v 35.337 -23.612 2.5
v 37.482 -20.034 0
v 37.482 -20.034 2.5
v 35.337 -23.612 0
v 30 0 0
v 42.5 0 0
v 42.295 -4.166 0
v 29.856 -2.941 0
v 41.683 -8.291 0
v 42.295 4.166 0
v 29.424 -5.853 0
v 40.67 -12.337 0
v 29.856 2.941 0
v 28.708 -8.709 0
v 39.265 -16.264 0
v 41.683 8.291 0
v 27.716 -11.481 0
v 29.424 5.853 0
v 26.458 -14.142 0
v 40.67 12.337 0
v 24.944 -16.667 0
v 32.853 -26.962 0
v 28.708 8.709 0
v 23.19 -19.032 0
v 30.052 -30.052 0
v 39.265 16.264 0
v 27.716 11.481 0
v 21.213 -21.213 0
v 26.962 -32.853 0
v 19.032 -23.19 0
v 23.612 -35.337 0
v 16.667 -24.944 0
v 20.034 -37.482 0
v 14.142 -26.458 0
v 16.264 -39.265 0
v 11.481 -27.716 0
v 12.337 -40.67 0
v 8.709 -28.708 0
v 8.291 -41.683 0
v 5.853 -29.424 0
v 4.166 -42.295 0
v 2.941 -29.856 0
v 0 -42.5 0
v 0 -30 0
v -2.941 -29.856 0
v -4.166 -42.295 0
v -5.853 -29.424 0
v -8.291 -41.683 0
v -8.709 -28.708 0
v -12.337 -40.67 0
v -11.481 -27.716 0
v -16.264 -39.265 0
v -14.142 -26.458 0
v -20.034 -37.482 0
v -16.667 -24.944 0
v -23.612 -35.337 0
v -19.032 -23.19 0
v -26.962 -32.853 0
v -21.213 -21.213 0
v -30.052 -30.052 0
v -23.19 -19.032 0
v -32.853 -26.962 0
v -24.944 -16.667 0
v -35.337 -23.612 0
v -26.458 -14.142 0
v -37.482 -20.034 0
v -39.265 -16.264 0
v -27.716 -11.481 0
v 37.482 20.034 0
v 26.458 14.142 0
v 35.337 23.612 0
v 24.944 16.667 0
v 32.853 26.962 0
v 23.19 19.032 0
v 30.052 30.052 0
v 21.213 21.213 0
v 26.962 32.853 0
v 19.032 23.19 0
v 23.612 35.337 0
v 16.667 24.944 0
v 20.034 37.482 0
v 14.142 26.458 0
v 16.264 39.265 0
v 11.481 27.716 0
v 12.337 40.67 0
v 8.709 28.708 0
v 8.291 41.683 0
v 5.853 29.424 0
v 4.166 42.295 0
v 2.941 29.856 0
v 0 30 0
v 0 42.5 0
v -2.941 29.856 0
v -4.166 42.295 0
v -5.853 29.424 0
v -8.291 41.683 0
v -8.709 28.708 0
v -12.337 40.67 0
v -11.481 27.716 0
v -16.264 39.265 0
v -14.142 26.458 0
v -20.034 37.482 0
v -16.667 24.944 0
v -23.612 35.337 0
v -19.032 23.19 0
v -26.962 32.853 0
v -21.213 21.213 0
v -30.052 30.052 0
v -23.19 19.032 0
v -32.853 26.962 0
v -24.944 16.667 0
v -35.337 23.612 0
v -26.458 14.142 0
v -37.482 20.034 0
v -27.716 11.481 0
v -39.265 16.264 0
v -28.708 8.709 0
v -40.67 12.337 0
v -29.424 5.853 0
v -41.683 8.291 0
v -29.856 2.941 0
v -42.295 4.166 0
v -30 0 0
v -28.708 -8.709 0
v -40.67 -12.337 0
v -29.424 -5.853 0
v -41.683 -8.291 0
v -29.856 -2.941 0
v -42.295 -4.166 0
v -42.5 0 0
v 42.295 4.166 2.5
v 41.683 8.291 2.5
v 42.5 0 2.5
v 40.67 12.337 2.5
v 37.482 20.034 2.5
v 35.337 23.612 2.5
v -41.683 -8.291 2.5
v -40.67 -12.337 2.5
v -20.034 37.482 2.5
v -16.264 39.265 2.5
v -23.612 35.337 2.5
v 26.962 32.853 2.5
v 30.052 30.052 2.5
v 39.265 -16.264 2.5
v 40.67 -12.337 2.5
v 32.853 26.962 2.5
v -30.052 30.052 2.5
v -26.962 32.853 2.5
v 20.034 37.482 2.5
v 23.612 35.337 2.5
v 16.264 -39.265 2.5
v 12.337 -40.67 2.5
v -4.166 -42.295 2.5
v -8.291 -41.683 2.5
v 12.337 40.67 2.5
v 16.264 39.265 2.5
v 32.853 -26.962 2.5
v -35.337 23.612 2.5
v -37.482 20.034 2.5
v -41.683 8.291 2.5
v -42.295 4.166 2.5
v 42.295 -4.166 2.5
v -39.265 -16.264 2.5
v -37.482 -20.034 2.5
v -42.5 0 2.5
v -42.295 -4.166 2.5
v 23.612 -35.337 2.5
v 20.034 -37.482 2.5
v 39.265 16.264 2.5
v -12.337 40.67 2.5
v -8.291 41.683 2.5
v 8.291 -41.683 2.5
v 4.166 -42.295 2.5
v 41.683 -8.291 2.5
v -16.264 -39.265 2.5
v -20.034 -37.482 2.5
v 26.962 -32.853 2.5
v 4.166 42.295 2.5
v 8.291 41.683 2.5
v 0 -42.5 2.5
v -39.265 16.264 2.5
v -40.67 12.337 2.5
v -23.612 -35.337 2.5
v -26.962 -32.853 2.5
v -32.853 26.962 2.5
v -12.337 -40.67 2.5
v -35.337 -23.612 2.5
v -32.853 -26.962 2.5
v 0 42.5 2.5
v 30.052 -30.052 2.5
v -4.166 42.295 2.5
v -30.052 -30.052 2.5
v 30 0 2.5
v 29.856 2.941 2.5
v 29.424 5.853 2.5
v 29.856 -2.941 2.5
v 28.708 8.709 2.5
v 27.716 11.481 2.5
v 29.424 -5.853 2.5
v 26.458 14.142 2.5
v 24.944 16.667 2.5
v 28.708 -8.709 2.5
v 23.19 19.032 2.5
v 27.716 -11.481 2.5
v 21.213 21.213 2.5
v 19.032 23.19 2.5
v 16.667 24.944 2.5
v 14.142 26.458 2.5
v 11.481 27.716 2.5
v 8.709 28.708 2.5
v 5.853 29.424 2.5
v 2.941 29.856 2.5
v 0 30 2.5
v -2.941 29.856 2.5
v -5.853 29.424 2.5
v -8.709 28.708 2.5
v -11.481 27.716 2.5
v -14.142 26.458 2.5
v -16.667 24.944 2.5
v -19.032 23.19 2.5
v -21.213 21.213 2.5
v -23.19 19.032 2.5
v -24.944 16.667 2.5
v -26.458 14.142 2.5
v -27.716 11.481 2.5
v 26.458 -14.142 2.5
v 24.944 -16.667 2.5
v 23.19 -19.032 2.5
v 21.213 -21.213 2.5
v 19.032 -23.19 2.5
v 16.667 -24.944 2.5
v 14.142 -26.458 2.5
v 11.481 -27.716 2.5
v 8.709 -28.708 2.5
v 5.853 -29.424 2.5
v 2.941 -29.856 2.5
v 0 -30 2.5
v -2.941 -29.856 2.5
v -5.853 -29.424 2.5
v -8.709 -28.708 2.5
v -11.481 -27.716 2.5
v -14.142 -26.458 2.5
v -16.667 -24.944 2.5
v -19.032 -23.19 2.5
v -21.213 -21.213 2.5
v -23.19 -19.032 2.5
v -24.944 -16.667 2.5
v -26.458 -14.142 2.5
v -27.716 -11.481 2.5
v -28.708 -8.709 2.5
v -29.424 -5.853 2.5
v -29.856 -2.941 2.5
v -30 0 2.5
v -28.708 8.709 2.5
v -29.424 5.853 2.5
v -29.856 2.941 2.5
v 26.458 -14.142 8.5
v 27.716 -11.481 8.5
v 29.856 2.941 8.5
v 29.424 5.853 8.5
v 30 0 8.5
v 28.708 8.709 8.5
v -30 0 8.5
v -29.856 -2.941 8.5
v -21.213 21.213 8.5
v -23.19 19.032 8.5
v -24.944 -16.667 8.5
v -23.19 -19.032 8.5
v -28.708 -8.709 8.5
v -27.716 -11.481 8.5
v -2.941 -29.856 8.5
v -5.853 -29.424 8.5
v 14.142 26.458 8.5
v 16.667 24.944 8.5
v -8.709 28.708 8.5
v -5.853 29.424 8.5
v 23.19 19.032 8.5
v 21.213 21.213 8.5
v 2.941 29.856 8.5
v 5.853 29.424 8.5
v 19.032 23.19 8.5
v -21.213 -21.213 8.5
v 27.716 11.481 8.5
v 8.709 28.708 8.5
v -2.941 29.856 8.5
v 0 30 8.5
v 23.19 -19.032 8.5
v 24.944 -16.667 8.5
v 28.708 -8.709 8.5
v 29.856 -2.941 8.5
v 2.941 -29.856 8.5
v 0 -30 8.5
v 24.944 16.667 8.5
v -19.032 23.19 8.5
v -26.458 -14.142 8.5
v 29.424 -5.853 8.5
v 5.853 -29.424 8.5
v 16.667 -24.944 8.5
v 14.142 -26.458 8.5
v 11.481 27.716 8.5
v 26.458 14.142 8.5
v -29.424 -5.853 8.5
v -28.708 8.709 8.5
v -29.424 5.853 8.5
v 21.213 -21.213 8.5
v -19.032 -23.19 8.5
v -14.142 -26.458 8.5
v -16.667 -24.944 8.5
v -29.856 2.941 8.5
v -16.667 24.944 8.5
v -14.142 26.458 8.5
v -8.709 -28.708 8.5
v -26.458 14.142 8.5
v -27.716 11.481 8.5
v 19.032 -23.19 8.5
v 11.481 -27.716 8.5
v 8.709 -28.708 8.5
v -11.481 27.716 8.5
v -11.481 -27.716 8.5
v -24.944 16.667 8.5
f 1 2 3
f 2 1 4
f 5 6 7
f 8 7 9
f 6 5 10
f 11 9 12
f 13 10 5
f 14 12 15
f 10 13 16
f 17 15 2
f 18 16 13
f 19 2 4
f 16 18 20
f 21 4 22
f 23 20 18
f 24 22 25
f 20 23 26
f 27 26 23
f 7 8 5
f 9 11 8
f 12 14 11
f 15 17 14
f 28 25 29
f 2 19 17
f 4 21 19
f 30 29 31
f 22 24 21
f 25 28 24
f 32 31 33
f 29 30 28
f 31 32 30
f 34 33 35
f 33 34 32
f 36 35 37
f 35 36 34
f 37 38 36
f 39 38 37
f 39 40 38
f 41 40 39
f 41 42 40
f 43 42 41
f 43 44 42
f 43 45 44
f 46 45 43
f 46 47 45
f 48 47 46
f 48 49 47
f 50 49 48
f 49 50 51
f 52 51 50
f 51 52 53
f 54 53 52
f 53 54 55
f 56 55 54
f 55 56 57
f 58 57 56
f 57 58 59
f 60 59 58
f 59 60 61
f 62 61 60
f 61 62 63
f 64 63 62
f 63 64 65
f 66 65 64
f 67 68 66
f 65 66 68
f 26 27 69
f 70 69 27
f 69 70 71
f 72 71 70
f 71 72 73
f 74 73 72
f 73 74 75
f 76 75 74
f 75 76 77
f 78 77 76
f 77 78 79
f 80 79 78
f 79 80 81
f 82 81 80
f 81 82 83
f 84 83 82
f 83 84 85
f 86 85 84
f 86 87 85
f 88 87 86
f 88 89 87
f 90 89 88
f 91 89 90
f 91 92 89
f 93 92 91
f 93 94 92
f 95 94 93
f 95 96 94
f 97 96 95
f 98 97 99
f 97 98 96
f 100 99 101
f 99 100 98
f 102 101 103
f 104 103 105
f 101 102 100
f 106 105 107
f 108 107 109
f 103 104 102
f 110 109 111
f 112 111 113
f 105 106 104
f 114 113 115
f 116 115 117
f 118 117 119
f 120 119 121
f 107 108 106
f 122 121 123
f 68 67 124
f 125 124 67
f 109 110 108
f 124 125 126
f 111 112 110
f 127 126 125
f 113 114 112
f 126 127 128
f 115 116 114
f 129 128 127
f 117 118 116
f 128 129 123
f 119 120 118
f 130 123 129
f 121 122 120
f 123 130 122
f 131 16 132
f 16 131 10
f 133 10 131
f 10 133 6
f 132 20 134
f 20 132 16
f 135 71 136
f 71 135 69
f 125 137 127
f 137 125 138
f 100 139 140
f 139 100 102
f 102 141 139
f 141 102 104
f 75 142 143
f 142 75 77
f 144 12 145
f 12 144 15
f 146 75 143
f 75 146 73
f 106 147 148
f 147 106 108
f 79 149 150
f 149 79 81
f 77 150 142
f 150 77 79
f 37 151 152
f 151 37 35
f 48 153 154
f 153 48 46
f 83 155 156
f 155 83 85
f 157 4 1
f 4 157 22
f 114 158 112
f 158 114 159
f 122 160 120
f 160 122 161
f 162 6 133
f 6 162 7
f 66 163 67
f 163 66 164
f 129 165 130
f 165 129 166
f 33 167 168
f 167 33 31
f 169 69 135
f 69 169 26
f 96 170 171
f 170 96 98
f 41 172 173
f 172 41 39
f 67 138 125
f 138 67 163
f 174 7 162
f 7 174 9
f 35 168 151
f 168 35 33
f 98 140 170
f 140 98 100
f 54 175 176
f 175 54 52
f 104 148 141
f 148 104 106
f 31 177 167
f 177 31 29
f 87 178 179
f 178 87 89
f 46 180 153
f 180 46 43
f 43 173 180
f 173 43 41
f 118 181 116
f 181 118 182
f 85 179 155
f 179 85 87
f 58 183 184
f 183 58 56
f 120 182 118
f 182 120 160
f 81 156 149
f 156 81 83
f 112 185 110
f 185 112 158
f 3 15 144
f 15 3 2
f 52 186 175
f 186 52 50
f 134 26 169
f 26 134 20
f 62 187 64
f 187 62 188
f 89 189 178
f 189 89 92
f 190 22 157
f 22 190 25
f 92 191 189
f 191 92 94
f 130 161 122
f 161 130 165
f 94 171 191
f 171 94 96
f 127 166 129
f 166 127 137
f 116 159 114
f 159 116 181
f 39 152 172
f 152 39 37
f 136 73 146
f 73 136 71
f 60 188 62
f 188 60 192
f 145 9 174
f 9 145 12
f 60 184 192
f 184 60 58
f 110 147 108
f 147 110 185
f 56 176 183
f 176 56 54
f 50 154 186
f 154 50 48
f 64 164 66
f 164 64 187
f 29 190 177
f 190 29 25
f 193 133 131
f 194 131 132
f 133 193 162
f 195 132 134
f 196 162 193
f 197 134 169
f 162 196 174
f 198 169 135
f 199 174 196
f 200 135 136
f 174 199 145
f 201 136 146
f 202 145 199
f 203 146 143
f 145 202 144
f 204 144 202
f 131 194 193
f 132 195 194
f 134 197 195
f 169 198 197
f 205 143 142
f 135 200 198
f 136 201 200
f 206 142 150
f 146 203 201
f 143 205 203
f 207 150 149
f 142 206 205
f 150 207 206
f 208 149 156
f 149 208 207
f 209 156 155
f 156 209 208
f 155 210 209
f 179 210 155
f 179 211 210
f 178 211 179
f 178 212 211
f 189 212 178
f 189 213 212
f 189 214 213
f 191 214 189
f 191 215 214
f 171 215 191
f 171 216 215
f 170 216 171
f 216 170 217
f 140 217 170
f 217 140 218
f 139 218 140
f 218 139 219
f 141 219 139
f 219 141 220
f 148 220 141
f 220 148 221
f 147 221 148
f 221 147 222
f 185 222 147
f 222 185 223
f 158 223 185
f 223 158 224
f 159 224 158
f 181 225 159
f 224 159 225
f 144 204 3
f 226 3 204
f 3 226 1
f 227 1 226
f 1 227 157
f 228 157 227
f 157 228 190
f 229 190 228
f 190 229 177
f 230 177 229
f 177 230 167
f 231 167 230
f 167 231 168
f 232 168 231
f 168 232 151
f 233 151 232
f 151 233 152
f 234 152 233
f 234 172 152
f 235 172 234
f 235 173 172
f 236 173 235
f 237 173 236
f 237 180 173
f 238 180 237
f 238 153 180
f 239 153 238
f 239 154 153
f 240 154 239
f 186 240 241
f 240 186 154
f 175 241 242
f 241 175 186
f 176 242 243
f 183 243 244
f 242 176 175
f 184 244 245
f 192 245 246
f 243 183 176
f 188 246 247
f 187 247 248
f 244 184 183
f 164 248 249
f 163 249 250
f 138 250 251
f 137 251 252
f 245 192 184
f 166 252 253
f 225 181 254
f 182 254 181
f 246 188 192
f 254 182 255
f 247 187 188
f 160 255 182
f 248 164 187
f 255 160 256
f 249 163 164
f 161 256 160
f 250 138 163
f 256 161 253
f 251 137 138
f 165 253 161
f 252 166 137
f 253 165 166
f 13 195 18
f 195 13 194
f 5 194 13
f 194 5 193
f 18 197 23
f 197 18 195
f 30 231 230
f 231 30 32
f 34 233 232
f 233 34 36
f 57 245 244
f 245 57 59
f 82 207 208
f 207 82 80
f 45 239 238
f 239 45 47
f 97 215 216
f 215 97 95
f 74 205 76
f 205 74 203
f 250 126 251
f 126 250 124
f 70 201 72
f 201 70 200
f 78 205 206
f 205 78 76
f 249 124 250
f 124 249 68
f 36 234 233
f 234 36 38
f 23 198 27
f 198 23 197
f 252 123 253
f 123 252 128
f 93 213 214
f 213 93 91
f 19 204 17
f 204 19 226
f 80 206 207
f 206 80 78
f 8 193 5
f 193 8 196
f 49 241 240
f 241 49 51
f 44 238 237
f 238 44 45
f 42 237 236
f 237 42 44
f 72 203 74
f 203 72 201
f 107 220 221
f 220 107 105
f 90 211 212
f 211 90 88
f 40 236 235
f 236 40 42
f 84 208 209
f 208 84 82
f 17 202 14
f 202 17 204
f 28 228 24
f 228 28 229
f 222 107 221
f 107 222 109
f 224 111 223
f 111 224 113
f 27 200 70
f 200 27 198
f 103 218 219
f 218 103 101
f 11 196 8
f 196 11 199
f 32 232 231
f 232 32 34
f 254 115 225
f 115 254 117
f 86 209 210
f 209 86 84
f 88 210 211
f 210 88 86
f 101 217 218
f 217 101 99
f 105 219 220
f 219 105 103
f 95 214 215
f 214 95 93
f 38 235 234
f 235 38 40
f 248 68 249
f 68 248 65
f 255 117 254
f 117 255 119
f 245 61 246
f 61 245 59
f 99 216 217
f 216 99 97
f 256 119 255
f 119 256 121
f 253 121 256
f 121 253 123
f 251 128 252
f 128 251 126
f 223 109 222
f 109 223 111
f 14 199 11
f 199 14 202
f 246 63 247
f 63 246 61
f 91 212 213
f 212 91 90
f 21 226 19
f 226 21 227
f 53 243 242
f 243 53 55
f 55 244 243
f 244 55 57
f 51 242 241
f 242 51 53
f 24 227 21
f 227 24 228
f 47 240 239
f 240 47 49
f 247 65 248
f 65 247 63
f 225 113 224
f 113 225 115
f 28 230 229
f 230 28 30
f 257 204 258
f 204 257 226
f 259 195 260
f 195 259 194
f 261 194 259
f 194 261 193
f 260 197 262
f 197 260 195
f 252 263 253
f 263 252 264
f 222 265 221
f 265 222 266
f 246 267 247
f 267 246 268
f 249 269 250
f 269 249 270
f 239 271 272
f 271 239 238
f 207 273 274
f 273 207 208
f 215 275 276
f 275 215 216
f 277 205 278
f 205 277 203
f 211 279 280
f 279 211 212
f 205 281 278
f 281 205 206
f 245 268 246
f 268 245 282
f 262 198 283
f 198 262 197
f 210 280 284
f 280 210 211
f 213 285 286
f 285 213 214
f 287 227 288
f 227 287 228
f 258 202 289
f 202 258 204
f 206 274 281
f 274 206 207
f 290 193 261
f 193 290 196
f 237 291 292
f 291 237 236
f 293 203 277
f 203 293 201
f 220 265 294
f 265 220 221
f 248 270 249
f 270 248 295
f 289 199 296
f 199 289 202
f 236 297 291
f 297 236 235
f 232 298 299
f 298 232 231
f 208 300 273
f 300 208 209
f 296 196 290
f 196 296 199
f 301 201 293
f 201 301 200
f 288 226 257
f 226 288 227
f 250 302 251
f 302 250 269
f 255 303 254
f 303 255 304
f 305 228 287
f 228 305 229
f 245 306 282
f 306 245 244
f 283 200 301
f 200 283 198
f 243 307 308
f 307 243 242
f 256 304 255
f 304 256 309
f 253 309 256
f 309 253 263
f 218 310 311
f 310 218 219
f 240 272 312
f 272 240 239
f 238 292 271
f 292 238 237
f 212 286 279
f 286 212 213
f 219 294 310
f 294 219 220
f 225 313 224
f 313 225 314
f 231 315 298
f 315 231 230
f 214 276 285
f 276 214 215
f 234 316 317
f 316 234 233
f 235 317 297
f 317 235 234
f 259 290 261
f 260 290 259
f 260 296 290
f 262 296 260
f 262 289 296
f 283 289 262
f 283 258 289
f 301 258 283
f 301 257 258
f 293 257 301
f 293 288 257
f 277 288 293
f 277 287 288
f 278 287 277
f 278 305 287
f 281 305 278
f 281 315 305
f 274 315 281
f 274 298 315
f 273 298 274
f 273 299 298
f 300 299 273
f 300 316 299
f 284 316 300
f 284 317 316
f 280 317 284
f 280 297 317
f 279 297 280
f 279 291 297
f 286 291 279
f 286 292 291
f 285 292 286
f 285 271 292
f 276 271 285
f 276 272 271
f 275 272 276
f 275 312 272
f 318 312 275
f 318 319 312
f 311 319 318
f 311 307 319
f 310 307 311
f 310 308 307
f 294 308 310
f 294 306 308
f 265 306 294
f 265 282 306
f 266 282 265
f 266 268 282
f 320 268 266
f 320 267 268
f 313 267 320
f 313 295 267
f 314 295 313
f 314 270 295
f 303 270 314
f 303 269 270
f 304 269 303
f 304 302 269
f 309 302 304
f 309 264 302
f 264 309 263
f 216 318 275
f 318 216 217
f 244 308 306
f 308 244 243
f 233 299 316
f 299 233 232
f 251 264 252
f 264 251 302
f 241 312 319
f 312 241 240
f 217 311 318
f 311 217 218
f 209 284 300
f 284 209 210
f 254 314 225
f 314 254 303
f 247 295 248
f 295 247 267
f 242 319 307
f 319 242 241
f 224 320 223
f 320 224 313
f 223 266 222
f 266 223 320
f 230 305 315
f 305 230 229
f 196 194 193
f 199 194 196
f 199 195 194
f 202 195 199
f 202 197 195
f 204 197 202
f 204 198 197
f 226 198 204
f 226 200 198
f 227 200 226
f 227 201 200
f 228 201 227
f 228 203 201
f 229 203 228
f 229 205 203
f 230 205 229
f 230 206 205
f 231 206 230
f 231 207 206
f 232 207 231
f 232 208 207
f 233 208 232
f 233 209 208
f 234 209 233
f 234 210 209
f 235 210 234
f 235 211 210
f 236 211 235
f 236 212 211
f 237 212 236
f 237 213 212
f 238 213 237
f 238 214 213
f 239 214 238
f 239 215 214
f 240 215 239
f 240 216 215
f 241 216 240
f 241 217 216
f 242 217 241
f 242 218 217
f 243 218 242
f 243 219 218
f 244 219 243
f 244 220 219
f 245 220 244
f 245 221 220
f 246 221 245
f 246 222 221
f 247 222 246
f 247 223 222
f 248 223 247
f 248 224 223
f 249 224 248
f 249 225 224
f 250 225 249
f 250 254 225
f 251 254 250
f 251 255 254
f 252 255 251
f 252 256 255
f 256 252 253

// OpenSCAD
// Concealed-pendant flush-cover plate (field installed after drywall).
plate_d = 85;
plate_t = 2.5;
recess_d = 60;
recess_h = 6;
difference() {
    cylinder(h = plate_t, d = plate_d, $fn = 64);
    translate([0, 0, -0.1])
        cylinder(h = plate_t + 0.2, d = recess_d, $fn = 64);
}
translate([0, 0, plate_t])
    cylinder(h = recess_h, d = recess_d, $fn = 64);
